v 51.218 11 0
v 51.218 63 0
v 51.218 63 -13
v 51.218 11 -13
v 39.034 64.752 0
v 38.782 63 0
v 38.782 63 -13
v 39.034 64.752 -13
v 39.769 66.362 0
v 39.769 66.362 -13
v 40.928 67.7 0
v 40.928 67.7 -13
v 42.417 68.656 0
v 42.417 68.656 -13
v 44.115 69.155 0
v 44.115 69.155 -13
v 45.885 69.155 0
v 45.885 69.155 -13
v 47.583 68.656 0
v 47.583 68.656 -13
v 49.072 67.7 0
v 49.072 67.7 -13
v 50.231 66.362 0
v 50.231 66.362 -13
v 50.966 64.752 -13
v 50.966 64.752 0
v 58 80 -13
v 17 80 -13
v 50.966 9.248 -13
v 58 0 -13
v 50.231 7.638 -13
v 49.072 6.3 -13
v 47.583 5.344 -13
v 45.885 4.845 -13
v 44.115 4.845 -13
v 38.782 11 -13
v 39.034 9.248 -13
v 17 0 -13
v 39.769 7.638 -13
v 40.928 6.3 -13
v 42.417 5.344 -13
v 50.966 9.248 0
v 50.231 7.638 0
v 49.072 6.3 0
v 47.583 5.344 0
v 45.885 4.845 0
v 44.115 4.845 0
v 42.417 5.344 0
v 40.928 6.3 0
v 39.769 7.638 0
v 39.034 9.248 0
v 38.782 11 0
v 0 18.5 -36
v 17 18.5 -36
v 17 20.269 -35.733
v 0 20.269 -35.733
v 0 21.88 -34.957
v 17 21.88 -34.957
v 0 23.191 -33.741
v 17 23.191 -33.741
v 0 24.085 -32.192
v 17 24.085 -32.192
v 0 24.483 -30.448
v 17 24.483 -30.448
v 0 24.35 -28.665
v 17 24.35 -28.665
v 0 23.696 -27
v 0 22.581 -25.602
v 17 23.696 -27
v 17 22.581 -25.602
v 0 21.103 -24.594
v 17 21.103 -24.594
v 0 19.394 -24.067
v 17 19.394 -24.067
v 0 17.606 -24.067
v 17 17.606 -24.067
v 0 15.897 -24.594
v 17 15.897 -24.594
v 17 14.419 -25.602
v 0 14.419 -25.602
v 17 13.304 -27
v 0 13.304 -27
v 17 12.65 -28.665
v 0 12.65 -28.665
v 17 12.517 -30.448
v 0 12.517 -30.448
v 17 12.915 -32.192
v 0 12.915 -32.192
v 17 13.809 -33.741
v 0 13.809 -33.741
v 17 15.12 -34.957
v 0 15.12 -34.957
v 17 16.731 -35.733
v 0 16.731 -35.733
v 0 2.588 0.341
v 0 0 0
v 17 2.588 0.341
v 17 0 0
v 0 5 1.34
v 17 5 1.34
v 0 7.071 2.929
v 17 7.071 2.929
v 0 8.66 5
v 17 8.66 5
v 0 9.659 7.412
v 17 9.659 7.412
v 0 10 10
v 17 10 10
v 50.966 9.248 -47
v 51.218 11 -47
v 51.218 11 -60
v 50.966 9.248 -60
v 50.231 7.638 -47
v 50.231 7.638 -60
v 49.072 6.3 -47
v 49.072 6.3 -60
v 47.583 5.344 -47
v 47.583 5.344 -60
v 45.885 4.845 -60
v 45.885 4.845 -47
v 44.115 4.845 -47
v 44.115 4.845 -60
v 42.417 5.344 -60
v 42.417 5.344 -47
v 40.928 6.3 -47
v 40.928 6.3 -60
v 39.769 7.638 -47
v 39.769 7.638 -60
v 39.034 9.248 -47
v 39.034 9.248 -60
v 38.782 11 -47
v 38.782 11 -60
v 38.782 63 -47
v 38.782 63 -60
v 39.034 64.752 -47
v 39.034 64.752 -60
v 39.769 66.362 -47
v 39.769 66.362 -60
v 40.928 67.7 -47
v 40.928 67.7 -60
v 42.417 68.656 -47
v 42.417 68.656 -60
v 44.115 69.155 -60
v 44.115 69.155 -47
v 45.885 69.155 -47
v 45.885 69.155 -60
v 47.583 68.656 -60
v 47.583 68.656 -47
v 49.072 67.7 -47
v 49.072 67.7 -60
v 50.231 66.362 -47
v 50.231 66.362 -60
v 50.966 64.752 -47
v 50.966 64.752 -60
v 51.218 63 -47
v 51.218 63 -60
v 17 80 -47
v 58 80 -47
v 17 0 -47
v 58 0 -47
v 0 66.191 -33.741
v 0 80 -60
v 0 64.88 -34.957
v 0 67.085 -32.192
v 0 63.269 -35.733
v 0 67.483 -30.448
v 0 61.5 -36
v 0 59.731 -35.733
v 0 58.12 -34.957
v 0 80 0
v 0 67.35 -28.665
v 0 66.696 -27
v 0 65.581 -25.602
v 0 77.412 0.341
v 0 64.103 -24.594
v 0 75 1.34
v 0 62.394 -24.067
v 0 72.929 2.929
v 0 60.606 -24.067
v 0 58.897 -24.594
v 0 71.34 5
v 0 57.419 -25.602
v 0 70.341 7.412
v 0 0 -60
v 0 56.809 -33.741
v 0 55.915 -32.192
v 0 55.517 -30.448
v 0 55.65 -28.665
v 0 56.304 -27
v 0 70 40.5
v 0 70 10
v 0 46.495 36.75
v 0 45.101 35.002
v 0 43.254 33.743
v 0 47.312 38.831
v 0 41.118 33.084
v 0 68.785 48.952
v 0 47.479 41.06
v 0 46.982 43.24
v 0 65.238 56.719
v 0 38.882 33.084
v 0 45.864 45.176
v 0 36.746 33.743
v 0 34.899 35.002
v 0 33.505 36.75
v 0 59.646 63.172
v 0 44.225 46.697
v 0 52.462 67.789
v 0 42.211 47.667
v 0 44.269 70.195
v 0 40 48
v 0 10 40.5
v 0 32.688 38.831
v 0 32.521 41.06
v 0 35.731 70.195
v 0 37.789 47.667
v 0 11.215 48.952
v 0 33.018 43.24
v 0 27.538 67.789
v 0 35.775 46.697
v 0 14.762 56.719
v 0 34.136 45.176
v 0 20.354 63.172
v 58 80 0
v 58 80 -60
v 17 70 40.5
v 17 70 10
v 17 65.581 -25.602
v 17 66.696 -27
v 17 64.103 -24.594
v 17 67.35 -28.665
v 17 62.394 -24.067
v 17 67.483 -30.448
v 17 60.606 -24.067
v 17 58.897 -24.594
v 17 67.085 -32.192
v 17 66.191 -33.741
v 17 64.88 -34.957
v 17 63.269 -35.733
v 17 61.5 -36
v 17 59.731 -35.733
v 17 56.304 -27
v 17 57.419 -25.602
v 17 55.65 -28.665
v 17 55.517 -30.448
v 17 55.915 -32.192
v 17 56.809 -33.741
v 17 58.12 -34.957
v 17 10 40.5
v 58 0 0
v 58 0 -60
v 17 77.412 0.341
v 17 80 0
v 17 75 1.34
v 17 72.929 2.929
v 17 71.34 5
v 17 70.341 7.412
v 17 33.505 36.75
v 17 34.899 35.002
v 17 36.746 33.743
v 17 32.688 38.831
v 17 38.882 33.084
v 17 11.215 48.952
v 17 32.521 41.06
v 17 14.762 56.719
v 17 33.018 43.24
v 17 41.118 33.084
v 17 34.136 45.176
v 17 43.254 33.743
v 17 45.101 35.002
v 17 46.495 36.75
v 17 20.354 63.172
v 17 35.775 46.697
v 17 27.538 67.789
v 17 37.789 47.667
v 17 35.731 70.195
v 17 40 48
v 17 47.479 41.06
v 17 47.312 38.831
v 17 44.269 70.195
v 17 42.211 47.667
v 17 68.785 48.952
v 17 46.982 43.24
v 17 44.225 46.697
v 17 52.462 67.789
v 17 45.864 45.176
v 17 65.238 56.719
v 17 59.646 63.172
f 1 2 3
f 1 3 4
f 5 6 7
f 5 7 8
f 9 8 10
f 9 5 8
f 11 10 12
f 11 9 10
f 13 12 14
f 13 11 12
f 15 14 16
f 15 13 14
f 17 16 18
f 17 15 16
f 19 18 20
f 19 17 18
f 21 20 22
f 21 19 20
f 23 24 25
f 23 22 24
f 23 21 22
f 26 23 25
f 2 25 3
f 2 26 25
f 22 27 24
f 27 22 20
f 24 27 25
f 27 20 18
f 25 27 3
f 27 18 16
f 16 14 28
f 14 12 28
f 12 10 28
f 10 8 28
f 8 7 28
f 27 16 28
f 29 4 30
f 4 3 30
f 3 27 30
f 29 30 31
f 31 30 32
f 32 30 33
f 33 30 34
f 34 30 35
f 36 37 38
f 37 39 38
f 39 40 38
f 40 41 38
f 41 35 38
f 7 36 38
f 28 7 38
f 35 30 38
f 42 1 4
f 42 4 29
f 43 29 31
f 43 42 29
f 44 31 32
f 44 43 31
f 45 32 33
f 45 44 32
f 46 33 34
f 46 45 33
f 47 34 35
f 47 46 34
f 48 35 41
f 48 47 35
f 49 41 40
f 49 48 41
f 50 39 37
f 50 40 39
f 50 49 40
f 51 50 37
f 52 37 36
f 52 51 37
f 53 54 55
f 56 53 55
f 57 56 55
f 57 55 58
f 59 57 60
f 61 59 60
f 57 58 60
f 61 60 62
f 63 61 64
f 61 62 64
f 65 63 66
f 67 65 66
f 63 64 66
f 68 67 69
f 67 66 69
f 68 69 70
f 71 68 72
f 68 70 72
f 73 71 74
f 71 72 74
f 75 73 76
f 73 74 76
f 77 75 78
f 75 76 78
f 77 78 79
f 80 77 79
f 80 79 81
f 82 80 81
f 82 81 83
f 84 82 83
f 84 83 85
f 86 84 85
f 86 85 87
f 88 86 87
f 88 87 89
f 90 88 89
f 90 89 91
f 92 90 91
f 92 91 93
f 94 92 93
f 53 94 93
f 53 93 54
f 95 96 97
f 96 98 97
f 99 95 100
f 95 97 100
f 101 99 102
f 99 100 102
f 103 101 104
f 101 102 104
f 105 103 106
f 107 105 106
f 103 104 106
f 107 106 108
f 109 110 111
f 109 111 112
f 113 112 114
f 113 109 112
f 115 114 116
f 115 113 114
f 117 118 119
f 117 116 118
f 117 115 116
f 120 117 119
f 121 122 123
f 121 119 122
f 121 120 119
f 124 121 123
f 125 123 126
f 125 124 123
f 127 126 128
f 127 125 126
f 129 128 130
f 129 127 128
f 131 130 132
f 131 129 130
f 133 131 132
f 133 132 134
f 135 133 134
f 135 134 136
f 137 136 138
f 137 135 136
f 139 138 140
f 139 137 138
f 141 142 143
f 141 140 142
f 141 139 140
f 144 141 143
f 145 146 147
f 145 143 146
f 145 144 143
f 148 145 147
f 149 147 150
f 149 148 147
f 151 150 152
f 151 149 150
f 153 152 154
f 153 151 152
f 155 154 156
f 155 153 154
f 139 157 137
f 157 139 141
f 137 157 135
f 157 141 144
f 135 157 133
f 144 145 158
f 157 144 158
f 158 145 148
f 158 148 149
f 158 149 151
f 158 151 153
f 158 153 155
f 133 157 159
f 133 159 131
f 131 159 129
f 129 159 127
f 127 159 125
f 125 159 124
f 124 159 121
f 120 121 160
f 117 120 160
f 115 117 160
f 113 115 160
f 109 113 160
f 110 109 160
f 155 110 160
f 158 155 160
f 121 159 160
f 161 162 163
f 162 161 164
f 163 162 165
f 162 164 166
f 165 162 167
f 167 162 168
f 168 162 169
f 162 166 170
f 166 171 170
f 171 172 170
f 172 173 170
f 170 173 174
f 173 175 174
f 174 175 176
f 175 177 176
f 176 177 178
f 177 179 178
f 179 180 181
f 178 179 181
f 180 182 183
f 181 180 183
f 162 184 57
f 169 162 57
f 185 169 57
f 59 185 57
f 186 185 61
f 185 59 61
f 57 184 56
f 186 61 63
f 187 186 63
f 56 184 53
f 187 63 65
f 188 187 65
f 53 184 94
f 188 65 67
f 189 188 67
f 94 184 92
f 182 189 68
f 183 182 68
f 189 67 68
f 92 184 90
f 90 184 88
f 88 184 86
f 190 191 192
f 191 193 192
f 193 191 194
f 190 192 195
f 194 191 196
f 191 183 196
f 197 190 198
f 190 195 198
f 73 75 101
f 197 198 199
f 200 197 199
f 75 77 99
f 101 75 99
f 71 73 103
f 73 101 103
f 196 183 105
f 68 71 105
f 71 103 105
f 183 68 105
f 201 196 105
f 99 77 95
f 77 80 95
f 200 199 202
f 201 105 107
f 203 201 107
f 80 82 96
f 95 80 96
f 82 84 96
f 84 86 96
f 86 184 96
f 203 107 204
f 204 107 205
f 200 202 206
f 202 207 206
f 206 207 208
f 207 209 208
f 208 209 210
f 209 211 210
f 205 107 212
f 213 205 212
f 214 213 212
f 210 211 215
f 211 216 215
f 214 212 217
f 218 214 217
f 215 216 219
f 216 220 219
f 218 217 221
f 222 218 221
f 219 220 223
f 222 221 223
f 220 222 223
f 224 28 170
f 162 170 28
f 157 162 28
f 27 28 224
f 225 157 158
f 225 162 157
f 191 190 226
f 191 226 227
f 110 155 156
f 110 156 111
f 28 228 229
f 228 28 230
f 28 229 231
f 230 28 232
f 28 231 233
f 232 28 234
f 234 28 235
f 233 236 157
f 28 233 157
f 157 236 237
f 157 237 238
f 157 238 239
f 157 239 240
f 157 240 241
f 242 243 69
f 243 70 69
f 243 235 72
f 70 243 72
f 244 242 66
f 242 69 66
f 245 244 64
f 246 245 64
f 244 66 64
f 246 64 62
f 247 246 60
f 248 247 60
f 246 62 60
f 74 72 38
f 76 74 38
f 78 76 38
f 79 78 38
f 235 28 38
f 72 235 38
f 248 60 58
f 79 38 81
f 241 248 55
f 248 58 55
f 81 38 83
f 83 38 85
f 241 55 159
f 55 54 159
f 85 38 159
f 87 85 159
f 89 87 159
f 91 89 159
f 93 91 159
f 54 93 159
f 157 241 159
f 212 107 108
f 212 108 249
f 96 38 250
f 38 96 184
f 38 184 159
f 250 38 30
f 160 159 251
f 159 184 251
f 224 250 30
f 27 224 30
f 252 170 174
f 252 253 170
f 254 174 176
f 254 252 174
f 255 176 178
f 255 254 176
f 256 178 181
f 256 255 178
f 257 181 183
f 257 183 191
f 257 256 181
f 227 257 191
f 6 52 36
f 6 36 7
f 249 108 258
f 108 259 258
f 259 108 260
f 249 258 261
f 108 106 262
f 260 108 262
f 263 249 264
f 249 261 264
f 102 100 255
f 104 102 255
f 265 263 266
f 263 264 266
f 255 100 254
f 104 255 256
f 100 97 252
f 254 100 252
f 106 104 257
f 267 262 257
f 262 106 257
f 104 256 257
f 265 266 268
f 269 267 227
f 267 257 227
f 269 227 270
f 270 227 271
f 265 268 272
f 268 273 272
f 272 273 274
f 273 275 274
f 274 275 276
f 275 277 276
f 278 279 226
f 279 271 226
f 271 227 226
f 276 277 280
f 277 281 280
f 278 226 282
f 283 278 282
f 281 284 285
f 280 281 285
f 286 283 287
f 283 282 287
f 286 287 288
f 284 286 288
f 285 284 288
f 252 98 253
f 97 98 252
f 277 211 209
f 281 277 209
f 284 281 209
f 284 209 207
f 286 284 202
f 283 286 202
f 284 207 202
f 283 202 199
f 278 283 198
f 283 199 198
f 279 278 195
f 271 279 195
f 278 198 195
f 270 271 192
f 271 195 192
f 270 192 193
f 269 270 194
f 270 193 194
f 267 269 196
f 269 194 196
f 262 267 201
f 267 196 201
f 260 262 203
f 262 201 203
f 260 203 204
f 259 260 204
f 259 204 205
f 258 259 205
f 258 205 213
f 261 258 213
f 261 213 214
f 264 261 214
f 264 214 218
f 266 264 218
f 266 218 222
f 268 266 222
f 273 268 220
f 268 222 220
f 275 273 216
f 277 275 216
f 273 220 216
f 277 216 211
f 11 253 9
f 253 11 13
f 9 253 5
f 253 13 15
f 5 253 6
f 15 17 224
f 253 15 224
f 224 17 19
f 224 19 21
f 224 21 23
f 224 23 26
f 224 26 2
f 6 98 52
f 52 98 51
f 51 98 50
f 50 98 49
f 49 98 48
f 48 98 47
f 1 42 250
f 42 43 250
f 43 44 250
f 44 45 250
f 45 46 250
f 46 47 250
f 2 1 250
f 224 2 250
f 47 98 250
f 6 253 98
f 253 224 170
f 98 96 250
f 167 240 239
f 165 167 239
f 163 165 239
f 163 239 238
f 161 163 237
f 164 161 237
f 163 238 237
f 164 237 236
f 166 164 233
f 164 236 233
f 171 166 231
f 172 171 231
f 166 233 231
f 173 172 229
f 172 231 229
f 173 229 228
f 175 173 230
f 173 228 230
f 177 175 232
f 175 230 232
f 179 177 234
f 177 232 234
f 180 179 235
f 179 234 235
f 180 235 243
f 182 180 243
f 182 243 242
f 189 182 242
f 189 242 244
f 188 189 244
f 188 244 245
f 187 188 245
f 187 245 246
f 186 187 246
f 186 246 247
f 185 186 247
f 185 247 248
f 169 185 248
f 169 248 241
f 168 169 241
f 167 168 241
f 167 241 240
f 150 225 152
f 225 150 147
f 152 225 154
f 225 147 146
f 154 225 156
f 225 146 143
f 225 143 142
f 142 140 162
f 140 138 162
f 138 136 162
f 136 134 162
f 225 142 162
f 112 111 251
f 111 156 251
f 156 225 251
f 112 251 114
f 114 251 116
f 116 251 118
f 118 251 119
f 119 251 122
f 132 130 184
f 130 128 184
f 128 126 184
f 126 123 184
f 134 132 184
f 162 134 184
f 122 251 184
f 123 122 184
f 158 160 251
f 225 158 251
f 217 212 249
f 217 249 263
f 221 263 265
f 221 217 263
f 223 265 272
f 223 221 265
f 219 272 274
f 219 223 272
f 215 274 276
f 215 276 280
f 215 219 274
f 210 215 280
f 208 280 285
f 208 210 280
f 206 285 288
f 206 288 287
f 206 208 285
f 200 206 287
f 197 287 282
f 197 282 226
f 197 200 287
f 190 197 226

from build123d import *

# Parameters (mm, degrees)
BOSS_EXTRUDE1_DEPTH = 80
CUT_EXTRUDE1_DEPTH  = 80
SKETCH4_R           = 6
CUT_EXTRUDE4_DEPTH  = 80
BOSS_EXTRUDE2_DEPTH = 17
SKETCH9_R           = 7.5
CUT_EXTRUDE5_DEPTH  = 17
FILLET2_R           = 10
FILLET3_R           = 10


with BuildPart() as part:
    # Sketch1 → Boss-Extrude1 (new body)
    with BuildSketch(Plane(origin=(0, 0, 0), x_dir=(1, 0, 0), z_dir=(0, 1, 0))):
        Polygon((0, 0), (58, 0), (58, 13), (17, 13), (17, 47), (58, 47), (58, 60), (0, 60), align=None)
    extrude(amount=BOSS_EXTRUDE1_DEPTH)

    # Sketch2 → Cut-Extrude1 (cut)
    with BuildSketch(Plane.XY):
        with BuildLine():
            Line((38.781649875, 11), (38.781649875, 63))
            ThreePointArc((38.781649875, 63), (45, 69.218350125), (51.218350125, 63))
            Line((51.218350125, 63), (51.218350125, 11))
            ThreePointArc((51.218350125, 11), (45, 4.781649875), (38.781649875, 11))
        make_face()
    extrude(amount=-CUT_EXTRUDE1_DEPTH, mode=Mode.SUBTRACT)

    # Sketch4 → Cut-Extrude4 (cut)
    with BuildSketch(Plane(origin=(17, 0, 0), x_dir=(0, 0, -1), z_dir=(1, 0, 0))):
        with Locations((30, 18.5)):
            Circle(SKETCH4_R)
        with Locations((30, 61.5)):
            Circle(SKETCH4_R)
    extrude(amount=-CUT_EXTRUDE4_DEPTH, mode=Mode.SUBTRACT)

    # Sketch8 → Boss-Extrude2 (add)
    with BuildSketch(Plane.ZY):
        with BuildLine():
            Line((40.5, 70), (0, 70))
            Line((0, 70), (0, 10))
            Line((0, 10), (40.5, 10))
            ThreePointArc((40.5, 10), (70.5, 40), (40.5, 70))
        make_face()
    extrude(amount=-BOSS_EXTRUDE2_DEPTH)

    # Sketch9 → Cut-Extrude5 (cut)
    with BuildSketch(Plane.ZY):
        with Locations((40.5, 40)):
            Circle(SKETCH9_R)
    extrude(amount=-CUT_EXTRUDE5_DEPTH, mode=Mode.SUBTRACT)

    # Fillet2
    fillet2_edges = [part.edges().sort_by_distance(p)[0] for p in [
        (8.5, 70, 0),
    ]]
    fillet(fillet2_edges, radius=FILLET2_R - 0.0001)  # a hair under: the kernel refuses the full size

    # Fillet3
    fillet3_edges = [part.edges().sort_by_distance(p)[0] for p in [
        (8.5, 10, 0),
    ]]
    fillet(fillet3_edges, radius=FILLET3_R - 0.0001)  # a hair under: the kernel refuses the full size


solid = part.part
